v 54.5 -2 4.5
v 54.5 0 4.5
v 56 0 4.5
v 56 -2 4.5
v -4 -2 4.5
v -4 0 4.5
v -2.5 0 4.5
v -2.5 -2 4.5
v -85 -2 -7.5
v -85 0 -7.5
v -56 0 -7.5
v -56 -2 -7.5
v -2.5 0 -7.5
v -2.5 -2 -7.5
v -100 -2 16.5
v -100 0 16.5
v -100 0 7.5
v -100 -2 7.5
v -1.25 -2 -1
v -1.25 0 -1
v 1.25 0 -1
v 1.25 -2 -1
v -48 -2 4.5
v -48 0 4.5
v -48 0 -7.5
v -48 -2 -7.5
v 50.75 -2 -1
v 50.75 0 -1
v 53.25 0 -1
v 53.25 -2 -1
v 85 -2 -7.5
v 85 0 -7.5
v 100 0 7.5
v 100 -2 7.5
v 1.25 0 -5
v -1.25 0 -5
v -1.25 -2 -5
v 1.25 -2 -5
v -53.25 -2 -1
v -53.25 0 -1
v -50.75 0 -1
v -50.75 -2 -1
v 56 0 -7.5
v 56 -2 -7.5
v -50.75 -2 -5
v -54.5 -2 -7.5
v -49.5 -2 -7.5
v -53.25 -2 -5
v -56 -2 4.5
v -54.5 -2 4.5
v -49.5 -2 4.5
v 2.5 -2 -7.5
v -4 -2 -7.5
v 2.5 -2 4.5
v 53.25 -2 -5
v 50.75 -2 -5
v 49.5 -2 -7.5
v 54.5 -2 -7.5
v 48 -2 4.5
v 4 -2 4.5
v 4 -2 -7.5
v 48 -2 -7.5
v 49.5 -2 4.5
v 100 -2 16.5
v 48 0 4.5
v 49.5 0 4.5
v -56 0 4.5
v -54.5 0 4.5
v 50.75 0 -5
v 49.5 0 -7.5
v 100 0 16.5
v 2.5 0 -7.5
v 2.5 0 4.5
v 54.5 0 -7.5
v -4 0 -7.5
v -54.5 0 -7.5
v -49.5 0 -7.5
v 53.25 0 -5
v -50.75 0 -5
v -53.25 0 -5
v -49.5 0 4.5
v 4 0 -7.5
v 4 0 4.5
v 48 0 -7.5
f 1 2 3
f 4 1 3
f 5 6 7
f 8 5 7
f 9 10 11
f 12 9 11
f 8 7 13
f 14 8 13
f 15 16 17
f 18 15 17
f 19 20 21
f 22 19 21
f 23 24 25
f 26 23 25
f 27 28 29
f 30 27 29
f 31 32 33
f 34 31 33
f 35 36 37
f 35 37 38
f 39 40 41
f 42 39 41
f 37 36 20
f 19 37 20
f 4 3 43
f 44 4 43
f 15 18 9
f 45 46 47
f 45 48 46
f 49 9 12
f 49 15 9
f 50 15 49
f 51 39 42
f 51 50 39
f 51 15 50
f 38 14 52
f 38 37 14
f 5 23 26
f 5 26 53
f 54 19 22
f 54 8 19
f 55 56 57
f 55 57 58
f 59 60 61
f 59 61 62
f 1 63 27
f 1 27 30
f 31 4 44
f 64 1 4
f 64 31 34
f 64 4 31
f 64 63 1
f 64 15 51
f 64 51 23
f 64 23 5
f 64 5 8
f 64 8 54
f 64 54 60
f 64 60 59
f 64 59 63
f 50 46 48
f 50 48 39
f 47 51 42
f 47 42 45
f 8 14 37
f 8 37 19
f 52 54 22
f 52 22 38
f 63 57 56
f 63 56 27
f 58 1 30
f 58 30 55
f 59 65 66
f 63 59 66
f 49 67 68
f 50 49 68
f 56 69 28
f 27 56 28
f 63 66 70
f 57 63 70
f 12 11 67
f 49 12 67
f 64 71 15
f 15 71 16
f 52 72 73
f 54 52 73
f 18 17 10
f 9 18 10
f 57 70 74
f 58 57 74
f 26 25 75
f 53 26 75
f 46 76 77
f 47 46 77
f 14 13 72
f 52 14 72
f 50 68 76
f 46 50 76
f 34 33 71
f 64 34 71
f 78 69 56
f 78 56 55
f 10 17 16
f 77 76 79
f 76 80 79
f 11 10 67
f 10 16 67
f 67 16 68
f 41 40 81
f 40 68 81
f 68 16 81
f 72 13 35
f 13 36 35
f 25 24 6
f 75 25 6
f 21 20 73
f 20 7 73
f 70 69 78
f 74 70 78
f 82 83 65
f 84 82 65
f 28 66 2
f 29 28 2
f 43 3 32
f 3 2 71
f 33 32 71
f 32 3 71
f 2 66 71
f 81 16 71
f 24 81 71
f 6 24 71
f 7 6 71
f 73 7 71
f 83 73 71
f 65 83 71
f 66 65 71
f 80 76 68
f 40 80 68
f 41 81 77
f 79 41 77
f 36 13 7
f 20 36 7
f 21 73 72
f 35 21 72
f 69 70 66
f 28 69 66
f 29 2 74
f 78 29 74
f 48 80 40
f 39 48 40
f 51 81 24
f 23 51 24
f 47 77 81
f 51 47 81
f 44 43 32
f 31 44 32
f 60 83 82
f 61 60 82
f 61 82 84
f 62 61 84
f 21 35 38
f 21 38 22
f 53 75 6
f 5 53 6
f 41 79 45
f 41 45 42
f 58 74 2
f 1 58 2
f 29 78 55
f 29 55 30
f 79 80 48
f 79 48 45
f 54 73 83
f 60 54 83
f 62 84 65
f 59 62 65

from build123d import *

# Parameters (mm, degrees)
F0_W     = 2.5
F0_H     = 4
F1_DEPTH = 2


# Not quite as in the source:
# - a feature names something its author has since deleted; it is built from what else it names


with BuildPart() as f1:
    # F0 (on Front) → F1 (new body)
    with BuildSketch(Plane.XZ):
        Polygon((56, -7.5), (85, -7.5), (85, 7.5), (-85, 7.5), (-85, -7.5), (-56, -7.5), (-56, 4.5), (-54.5, 4.5), (-54.5, -7.5), (-49.5, -7.5), (-49.5, 4.5), (-48, 4.5), (-48, -7.5), (-4, -7.5), (-4, 4.5), (-2.5, 4.5), (-2.5, -7.5), (2.5, -7.5), (2.5, 4.5), (4, 4.5), (4, -7.5), (48, -7.5), (48, 4.5), (49.5, 4.5), (49.5, -7.5), (54.5, -7.5), (54.5, 4.5), (56, 4.5), align=None)
        with Locations((-52, -3)):
            Rectangle(F0_W, F0_H, mode=Mode.SUBTRACT)
        with Locations((0, -3)):
            Rectangle(F0_W, F0_H, mode=Mode.SUBTRACT)
        with Locations((52, -3)):
            Rectangle(F0_W, F0_H, mode=Mode.SUBTRACT)
        Polygon((-85, -7.5), (-85, 7.5), (-100, 7.5), align=None)
        Polygon((85, 7.5), (85, -7.5), (100, 7.5), align=None)
        Polygon((-85, 7.5), (85, 7.5), (100, 7.5), (100, 16.5), (-100, 16.5), (-100, 7.5), align=None)
    extrude(amount=F1_DEPTH)


solid = f1.part
